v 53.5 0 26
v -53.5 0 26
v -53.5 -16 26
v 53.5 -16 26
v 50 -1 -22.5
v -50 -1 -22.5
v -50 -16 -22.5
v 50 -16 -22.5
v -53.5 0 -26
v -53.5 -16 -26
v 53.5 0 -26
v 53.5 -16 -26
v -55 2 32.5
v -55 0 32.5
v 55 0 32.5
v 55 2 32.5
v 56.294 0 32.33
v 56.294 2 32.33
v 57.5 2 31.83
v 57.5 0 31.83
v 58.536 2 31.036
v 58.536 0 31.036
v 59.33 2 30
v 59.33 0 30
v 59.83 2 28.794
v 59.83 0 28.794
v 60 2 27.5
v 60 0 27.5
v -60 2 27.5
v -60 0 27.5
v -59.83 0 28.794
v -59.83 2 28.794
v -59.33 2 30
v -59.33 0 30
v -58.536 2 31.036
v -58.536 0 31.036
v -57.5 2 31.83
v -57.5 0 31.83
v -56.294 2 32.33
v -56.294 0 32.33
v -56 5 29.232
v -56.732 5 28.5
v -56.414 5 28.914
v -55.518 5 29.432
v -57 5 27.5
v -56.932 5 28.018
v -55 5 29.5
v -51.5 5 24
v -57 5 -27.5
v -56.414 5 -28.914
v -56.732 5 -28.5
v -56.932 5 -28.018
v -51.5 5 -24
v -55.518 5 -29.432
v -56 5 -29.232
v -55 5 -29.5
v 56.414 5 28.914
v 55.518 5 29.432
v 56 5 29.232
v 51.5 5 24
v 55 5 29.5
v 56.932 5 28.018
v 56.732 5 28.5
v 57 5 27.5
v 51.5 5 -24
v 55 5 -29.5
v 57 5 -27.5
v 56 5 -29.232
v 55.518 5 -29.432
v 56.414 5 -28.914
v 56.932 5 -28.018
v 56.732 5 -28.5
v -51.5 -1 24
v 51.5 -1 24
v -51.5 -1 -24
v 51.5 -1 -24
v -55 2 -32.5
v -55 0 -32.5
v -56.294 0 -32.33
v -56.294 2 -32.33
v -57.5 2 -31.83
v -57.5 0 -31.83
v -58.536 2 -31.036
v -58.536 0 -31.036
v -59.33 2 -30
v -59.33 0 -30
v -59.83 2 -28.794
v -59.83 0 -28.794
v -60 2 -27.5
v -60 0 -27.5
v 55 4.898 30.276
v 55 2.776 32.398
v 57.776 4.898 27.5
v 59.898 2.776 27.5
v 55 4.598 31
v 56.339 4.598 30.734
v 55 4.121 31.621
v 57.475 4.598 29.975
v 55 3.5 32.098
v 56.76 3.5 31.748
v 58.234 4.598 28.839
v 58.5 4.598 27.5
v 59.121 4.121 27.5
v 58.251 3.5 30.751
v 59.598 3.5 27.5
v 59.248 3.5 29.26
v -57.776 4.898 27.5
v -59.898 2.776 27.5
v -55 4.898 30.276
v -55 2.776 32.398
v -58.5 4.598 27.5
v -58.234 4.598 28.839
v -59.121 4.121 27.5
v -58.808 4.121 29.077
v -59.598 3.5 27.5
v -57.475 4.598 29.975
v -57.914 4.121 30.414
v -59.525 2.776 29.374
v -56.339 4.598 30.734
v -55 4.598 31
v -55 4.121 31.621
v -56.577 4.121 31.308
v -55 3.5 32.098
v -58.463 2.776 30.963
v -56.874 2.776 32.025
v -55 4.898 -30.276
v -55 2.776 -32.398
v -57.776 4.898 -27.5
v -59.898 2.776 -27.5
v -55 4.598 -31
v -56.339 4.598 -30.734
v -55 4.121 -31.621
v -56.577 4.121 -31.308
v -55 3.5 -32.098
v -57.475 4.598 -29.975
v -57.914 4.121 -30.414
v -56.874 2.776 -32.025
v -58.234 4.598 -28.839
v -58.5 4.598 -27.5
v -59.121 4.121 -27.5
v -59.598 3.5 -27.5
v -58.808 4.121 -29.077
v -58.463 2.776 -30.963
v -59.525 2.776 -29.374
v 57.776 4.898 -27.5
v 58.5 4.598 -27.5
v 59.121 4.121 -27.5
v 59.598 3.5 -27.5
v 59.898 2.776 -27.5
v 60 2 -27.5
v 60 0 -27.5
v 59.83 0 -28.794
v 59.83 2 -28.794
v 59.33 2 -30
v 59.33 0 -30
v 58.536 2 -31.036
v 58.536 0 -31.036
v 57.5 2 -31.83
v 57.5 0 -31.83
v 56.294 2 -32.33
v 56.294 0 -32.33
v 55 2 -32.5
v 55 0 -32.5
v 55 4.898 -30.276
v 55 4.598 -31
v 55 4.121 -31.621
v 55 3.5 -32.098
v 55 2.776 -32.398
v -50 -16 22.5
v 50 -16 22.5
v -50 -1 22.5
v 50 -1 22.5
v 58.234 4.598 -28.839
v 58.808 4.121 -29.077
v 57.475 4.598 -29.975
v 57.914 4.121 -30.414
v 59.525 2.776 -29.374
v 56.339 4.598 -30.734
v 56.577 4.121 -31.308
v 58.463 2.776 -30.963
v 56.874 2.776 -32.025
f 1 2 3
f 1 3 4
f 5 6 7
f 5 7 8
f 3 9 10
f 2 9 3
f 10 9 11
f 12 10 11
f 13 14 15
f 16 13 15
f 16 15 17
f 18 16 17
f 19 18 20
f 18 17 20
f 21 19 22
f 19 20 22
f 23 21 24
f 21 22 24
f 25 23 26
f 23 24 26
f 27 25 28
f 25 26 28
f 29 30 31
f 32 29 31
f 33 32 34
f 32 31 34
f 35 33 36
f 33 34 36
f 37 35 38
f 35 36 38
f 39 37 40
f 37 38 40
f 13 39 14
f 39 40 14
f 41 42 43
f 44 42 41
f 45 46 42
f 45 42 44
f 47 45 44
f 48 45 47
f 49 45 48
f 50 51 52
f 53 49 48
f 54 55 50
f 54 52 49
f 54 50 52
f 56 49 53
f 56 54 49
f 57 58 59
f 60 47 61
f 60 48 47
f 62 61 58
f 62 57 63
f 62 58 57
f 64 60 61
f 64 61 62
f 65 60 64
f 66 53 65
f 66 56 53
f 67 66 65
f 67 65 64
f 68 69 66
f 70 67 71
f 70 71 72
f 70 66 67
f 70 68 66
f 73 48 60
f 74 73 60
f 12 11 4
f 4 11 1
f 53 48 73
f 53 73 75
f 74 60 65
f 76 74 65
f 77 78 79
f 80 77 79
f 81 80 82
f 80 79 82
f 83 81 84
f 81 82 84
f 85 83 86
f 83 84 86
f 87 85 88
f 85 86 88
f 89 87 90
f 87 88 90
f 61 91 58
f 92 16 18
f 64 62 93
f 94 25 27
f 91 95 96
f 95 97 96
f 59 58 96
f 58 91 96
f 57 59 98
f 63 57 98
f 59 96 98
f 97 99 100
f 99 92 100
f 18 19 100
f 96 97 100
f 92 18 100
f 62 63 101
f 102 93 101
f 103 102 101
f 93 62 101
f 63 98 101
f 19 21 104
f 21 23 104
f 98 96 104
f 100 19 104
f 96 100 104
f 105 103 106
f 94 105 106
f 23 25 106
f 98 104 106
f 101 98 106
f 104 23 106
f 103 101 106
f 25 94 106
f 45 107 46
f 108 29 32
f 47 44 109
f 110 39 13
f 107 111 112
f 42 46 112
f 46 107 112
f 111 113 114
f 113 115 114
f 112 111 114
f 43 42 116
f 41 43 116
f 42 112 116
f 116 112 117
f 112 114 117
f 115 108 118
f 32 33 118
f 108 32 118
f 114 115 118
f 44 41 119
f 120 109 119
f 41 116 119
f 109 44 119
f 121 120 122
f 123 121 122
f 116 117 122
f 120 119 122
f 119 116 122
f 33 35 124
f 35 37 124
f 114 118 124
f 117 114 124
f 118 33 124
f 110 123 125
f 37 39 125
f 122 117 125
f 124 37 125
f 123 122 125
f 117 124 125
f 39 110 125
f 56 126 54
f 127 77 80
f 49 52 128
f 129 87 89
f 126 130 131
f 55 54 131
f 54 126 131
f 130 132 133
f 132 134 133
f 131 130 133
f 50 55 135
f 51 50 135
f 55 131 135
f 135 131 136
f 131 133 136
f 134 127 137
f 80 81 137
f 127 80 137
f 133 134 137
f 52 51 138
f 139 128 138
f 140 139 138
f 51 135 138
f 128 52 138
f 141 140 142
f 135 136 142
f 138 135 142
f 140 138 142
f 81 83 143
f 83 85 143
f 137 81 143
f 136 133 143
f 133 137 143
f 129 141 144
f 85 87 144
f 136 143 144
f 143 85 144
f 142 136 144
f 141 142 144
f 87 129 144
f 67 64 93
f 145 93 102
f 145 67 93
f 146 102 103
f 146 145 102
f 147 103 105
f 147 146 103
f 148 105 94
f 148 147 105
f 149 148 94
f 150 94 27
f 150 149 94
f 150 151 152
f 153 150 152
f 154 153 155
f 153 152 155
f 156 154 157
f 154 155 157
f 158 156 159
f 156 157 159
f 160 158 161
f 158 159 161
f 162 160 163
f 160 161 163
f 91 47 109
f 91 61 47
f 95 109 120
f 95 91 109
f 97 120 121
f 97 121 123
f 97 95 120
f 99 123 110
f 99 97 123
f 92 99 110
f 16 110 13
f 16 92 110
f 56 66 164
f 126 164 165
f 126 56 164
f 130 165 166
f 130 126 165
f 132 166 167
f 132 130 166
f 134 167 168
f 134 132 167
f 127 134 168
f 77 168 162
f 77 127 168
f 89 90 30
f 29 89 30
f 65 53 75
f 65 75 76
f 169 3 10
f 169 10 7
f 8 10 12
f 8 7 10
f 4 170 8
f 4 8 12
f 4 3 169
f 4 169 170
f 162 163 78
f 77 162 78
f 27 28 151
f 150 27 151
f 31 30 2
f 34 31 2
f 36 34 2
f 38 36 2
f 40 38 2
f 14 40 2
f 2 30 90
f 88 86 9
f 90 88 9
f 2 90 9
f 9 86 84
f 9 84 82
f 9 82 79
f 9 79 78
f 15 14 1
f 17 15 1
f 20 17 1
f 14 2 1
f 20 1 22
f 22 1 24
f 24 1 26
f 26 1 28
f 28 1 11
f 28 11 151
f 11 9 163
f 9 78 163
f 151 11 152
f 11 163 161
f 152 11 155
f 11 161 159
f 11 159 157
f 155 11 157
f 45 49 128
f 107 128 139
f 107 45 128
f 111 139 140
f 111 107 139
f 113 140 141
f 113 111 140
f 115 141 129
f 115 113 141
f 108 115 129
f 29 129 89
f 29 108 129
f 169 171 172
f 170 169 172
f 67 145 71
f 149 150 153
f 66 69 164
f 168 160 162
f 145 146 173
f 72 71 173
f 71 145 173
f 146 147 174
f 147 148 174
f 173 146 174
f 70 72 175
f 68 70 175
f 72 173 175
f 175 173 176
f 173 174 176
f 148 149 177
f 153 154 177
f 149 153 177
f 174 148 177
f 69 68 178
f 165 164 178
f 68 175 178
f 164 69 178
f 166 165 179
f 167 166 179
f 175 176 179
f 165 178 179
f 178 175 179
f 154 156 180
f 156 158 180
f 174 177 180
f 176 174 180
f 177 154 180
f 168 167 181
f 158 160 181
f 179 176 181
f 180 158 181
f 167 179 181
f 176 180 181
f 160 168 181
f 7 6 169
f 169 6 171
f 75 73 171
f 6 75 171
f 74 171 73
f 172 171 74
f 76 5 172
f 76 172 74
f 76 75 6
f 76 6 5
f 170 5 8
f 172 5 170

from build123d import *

# Parameters (mm, degrees)
SKETCH1_W           = 100
SKETCH1_H           = 45
BOSS_EXTRUDE1_DEPTH = 5
SKETCH2_W           = 107
SKETCH2_H           = 52
SKETCH2_W_2         = 100
SKETCH2_H_2         = 45
BOSS_EXTRUDE2_DEPTH = 16
FILLET1_R           = 3
SKETCH3_W           = 103
SKETCH3_H           = 48
SKETCH3_W_2         = 100
SKETCH3_H_2         = 45
CUT_EXTRUDE1_DEPTH  = 6


with BuildPart() as part:
    # Sketch1 → Boss-Extrude1 (new body)
    with BuildSketch(Plane(origin=(0, 0, 0), x_dir=(1, 0, 0), z_dir=(0, 1, 0))):
        with BuildLine():
            Line((-55, -32.5), (55, -32.5))
            ThreePointArc((55, -32.5), (58.535533906, -31.035533906), (60, -27.5))
            Line((60, -27.5), (60, 27.5))
            ThreePointArc((60, 27.5), (58.535533906, 31.035533906), (55, 32.5))
            Line((55, 32.5), (-55, 32.5))
            ThreePointArc((-55, 32.5), (-58.535533906, 31.035533906), (-60, 27.5))
            Line((-60, 27.5), (-60, -27.5))
            ThreePointArc((-60, -27.5), (-58.535533906, -31.035533906), (-55, -32.5))
        make_face()
        Rectangle(SKETCH1_W, SKETCH1_H, mode=Mode.SUBTRACT)
    extrude(amount=BOSS_EXTRUDE1_DEPTH)

    # Sketch2 → Boss-Extrude2 (add)
    with BuildSketch(Plane.XZ):
        Rectangle(SKETCH2_W, SKETCH2_H)
        Rectangle(SKETCH2_W_2, SKETCH2_H_2, mode=Mode.SUBTRACT)
    extrude(amount=BOSS_EXTRUDE2_DEPTH)

    # Fillet1
    fillet1_edges = [part.edges().sort_by_distance(p)[0] for p in [
        (58.535533906, 5, 31.035533906),
        (60, 5, 0),
        (58.535533906, 5, -31.035533906),
        (0, 5, -32.5),
        (-58.535533906, 5, -31.035533906),
        (-60, 5, 0),
        (-58.535533906, 5, 31.035533906),
        (0, 5, 32.5),
    ]]
    fillet(fillet1_edges, radius=FILLET1_R)

    # Sketch3 → Cut-Extrude1 (cut)
    with BuildSketch(Plane(origin=(0, 5, 0), x_dir=(1, 0, 0), z_dir=(0, 1, 0))):
        Rectangle(SKETCH3_W, SKETCH3_H)
        Rectangle(SKETCH3_W_2, SKETCH3_H_2, mode=Mode.SUBTRACT)
    extrude(amount=-CUT_EXTRUDE1_DEPTH, mode=Mode.SUBTRACT)


solid = part.part
